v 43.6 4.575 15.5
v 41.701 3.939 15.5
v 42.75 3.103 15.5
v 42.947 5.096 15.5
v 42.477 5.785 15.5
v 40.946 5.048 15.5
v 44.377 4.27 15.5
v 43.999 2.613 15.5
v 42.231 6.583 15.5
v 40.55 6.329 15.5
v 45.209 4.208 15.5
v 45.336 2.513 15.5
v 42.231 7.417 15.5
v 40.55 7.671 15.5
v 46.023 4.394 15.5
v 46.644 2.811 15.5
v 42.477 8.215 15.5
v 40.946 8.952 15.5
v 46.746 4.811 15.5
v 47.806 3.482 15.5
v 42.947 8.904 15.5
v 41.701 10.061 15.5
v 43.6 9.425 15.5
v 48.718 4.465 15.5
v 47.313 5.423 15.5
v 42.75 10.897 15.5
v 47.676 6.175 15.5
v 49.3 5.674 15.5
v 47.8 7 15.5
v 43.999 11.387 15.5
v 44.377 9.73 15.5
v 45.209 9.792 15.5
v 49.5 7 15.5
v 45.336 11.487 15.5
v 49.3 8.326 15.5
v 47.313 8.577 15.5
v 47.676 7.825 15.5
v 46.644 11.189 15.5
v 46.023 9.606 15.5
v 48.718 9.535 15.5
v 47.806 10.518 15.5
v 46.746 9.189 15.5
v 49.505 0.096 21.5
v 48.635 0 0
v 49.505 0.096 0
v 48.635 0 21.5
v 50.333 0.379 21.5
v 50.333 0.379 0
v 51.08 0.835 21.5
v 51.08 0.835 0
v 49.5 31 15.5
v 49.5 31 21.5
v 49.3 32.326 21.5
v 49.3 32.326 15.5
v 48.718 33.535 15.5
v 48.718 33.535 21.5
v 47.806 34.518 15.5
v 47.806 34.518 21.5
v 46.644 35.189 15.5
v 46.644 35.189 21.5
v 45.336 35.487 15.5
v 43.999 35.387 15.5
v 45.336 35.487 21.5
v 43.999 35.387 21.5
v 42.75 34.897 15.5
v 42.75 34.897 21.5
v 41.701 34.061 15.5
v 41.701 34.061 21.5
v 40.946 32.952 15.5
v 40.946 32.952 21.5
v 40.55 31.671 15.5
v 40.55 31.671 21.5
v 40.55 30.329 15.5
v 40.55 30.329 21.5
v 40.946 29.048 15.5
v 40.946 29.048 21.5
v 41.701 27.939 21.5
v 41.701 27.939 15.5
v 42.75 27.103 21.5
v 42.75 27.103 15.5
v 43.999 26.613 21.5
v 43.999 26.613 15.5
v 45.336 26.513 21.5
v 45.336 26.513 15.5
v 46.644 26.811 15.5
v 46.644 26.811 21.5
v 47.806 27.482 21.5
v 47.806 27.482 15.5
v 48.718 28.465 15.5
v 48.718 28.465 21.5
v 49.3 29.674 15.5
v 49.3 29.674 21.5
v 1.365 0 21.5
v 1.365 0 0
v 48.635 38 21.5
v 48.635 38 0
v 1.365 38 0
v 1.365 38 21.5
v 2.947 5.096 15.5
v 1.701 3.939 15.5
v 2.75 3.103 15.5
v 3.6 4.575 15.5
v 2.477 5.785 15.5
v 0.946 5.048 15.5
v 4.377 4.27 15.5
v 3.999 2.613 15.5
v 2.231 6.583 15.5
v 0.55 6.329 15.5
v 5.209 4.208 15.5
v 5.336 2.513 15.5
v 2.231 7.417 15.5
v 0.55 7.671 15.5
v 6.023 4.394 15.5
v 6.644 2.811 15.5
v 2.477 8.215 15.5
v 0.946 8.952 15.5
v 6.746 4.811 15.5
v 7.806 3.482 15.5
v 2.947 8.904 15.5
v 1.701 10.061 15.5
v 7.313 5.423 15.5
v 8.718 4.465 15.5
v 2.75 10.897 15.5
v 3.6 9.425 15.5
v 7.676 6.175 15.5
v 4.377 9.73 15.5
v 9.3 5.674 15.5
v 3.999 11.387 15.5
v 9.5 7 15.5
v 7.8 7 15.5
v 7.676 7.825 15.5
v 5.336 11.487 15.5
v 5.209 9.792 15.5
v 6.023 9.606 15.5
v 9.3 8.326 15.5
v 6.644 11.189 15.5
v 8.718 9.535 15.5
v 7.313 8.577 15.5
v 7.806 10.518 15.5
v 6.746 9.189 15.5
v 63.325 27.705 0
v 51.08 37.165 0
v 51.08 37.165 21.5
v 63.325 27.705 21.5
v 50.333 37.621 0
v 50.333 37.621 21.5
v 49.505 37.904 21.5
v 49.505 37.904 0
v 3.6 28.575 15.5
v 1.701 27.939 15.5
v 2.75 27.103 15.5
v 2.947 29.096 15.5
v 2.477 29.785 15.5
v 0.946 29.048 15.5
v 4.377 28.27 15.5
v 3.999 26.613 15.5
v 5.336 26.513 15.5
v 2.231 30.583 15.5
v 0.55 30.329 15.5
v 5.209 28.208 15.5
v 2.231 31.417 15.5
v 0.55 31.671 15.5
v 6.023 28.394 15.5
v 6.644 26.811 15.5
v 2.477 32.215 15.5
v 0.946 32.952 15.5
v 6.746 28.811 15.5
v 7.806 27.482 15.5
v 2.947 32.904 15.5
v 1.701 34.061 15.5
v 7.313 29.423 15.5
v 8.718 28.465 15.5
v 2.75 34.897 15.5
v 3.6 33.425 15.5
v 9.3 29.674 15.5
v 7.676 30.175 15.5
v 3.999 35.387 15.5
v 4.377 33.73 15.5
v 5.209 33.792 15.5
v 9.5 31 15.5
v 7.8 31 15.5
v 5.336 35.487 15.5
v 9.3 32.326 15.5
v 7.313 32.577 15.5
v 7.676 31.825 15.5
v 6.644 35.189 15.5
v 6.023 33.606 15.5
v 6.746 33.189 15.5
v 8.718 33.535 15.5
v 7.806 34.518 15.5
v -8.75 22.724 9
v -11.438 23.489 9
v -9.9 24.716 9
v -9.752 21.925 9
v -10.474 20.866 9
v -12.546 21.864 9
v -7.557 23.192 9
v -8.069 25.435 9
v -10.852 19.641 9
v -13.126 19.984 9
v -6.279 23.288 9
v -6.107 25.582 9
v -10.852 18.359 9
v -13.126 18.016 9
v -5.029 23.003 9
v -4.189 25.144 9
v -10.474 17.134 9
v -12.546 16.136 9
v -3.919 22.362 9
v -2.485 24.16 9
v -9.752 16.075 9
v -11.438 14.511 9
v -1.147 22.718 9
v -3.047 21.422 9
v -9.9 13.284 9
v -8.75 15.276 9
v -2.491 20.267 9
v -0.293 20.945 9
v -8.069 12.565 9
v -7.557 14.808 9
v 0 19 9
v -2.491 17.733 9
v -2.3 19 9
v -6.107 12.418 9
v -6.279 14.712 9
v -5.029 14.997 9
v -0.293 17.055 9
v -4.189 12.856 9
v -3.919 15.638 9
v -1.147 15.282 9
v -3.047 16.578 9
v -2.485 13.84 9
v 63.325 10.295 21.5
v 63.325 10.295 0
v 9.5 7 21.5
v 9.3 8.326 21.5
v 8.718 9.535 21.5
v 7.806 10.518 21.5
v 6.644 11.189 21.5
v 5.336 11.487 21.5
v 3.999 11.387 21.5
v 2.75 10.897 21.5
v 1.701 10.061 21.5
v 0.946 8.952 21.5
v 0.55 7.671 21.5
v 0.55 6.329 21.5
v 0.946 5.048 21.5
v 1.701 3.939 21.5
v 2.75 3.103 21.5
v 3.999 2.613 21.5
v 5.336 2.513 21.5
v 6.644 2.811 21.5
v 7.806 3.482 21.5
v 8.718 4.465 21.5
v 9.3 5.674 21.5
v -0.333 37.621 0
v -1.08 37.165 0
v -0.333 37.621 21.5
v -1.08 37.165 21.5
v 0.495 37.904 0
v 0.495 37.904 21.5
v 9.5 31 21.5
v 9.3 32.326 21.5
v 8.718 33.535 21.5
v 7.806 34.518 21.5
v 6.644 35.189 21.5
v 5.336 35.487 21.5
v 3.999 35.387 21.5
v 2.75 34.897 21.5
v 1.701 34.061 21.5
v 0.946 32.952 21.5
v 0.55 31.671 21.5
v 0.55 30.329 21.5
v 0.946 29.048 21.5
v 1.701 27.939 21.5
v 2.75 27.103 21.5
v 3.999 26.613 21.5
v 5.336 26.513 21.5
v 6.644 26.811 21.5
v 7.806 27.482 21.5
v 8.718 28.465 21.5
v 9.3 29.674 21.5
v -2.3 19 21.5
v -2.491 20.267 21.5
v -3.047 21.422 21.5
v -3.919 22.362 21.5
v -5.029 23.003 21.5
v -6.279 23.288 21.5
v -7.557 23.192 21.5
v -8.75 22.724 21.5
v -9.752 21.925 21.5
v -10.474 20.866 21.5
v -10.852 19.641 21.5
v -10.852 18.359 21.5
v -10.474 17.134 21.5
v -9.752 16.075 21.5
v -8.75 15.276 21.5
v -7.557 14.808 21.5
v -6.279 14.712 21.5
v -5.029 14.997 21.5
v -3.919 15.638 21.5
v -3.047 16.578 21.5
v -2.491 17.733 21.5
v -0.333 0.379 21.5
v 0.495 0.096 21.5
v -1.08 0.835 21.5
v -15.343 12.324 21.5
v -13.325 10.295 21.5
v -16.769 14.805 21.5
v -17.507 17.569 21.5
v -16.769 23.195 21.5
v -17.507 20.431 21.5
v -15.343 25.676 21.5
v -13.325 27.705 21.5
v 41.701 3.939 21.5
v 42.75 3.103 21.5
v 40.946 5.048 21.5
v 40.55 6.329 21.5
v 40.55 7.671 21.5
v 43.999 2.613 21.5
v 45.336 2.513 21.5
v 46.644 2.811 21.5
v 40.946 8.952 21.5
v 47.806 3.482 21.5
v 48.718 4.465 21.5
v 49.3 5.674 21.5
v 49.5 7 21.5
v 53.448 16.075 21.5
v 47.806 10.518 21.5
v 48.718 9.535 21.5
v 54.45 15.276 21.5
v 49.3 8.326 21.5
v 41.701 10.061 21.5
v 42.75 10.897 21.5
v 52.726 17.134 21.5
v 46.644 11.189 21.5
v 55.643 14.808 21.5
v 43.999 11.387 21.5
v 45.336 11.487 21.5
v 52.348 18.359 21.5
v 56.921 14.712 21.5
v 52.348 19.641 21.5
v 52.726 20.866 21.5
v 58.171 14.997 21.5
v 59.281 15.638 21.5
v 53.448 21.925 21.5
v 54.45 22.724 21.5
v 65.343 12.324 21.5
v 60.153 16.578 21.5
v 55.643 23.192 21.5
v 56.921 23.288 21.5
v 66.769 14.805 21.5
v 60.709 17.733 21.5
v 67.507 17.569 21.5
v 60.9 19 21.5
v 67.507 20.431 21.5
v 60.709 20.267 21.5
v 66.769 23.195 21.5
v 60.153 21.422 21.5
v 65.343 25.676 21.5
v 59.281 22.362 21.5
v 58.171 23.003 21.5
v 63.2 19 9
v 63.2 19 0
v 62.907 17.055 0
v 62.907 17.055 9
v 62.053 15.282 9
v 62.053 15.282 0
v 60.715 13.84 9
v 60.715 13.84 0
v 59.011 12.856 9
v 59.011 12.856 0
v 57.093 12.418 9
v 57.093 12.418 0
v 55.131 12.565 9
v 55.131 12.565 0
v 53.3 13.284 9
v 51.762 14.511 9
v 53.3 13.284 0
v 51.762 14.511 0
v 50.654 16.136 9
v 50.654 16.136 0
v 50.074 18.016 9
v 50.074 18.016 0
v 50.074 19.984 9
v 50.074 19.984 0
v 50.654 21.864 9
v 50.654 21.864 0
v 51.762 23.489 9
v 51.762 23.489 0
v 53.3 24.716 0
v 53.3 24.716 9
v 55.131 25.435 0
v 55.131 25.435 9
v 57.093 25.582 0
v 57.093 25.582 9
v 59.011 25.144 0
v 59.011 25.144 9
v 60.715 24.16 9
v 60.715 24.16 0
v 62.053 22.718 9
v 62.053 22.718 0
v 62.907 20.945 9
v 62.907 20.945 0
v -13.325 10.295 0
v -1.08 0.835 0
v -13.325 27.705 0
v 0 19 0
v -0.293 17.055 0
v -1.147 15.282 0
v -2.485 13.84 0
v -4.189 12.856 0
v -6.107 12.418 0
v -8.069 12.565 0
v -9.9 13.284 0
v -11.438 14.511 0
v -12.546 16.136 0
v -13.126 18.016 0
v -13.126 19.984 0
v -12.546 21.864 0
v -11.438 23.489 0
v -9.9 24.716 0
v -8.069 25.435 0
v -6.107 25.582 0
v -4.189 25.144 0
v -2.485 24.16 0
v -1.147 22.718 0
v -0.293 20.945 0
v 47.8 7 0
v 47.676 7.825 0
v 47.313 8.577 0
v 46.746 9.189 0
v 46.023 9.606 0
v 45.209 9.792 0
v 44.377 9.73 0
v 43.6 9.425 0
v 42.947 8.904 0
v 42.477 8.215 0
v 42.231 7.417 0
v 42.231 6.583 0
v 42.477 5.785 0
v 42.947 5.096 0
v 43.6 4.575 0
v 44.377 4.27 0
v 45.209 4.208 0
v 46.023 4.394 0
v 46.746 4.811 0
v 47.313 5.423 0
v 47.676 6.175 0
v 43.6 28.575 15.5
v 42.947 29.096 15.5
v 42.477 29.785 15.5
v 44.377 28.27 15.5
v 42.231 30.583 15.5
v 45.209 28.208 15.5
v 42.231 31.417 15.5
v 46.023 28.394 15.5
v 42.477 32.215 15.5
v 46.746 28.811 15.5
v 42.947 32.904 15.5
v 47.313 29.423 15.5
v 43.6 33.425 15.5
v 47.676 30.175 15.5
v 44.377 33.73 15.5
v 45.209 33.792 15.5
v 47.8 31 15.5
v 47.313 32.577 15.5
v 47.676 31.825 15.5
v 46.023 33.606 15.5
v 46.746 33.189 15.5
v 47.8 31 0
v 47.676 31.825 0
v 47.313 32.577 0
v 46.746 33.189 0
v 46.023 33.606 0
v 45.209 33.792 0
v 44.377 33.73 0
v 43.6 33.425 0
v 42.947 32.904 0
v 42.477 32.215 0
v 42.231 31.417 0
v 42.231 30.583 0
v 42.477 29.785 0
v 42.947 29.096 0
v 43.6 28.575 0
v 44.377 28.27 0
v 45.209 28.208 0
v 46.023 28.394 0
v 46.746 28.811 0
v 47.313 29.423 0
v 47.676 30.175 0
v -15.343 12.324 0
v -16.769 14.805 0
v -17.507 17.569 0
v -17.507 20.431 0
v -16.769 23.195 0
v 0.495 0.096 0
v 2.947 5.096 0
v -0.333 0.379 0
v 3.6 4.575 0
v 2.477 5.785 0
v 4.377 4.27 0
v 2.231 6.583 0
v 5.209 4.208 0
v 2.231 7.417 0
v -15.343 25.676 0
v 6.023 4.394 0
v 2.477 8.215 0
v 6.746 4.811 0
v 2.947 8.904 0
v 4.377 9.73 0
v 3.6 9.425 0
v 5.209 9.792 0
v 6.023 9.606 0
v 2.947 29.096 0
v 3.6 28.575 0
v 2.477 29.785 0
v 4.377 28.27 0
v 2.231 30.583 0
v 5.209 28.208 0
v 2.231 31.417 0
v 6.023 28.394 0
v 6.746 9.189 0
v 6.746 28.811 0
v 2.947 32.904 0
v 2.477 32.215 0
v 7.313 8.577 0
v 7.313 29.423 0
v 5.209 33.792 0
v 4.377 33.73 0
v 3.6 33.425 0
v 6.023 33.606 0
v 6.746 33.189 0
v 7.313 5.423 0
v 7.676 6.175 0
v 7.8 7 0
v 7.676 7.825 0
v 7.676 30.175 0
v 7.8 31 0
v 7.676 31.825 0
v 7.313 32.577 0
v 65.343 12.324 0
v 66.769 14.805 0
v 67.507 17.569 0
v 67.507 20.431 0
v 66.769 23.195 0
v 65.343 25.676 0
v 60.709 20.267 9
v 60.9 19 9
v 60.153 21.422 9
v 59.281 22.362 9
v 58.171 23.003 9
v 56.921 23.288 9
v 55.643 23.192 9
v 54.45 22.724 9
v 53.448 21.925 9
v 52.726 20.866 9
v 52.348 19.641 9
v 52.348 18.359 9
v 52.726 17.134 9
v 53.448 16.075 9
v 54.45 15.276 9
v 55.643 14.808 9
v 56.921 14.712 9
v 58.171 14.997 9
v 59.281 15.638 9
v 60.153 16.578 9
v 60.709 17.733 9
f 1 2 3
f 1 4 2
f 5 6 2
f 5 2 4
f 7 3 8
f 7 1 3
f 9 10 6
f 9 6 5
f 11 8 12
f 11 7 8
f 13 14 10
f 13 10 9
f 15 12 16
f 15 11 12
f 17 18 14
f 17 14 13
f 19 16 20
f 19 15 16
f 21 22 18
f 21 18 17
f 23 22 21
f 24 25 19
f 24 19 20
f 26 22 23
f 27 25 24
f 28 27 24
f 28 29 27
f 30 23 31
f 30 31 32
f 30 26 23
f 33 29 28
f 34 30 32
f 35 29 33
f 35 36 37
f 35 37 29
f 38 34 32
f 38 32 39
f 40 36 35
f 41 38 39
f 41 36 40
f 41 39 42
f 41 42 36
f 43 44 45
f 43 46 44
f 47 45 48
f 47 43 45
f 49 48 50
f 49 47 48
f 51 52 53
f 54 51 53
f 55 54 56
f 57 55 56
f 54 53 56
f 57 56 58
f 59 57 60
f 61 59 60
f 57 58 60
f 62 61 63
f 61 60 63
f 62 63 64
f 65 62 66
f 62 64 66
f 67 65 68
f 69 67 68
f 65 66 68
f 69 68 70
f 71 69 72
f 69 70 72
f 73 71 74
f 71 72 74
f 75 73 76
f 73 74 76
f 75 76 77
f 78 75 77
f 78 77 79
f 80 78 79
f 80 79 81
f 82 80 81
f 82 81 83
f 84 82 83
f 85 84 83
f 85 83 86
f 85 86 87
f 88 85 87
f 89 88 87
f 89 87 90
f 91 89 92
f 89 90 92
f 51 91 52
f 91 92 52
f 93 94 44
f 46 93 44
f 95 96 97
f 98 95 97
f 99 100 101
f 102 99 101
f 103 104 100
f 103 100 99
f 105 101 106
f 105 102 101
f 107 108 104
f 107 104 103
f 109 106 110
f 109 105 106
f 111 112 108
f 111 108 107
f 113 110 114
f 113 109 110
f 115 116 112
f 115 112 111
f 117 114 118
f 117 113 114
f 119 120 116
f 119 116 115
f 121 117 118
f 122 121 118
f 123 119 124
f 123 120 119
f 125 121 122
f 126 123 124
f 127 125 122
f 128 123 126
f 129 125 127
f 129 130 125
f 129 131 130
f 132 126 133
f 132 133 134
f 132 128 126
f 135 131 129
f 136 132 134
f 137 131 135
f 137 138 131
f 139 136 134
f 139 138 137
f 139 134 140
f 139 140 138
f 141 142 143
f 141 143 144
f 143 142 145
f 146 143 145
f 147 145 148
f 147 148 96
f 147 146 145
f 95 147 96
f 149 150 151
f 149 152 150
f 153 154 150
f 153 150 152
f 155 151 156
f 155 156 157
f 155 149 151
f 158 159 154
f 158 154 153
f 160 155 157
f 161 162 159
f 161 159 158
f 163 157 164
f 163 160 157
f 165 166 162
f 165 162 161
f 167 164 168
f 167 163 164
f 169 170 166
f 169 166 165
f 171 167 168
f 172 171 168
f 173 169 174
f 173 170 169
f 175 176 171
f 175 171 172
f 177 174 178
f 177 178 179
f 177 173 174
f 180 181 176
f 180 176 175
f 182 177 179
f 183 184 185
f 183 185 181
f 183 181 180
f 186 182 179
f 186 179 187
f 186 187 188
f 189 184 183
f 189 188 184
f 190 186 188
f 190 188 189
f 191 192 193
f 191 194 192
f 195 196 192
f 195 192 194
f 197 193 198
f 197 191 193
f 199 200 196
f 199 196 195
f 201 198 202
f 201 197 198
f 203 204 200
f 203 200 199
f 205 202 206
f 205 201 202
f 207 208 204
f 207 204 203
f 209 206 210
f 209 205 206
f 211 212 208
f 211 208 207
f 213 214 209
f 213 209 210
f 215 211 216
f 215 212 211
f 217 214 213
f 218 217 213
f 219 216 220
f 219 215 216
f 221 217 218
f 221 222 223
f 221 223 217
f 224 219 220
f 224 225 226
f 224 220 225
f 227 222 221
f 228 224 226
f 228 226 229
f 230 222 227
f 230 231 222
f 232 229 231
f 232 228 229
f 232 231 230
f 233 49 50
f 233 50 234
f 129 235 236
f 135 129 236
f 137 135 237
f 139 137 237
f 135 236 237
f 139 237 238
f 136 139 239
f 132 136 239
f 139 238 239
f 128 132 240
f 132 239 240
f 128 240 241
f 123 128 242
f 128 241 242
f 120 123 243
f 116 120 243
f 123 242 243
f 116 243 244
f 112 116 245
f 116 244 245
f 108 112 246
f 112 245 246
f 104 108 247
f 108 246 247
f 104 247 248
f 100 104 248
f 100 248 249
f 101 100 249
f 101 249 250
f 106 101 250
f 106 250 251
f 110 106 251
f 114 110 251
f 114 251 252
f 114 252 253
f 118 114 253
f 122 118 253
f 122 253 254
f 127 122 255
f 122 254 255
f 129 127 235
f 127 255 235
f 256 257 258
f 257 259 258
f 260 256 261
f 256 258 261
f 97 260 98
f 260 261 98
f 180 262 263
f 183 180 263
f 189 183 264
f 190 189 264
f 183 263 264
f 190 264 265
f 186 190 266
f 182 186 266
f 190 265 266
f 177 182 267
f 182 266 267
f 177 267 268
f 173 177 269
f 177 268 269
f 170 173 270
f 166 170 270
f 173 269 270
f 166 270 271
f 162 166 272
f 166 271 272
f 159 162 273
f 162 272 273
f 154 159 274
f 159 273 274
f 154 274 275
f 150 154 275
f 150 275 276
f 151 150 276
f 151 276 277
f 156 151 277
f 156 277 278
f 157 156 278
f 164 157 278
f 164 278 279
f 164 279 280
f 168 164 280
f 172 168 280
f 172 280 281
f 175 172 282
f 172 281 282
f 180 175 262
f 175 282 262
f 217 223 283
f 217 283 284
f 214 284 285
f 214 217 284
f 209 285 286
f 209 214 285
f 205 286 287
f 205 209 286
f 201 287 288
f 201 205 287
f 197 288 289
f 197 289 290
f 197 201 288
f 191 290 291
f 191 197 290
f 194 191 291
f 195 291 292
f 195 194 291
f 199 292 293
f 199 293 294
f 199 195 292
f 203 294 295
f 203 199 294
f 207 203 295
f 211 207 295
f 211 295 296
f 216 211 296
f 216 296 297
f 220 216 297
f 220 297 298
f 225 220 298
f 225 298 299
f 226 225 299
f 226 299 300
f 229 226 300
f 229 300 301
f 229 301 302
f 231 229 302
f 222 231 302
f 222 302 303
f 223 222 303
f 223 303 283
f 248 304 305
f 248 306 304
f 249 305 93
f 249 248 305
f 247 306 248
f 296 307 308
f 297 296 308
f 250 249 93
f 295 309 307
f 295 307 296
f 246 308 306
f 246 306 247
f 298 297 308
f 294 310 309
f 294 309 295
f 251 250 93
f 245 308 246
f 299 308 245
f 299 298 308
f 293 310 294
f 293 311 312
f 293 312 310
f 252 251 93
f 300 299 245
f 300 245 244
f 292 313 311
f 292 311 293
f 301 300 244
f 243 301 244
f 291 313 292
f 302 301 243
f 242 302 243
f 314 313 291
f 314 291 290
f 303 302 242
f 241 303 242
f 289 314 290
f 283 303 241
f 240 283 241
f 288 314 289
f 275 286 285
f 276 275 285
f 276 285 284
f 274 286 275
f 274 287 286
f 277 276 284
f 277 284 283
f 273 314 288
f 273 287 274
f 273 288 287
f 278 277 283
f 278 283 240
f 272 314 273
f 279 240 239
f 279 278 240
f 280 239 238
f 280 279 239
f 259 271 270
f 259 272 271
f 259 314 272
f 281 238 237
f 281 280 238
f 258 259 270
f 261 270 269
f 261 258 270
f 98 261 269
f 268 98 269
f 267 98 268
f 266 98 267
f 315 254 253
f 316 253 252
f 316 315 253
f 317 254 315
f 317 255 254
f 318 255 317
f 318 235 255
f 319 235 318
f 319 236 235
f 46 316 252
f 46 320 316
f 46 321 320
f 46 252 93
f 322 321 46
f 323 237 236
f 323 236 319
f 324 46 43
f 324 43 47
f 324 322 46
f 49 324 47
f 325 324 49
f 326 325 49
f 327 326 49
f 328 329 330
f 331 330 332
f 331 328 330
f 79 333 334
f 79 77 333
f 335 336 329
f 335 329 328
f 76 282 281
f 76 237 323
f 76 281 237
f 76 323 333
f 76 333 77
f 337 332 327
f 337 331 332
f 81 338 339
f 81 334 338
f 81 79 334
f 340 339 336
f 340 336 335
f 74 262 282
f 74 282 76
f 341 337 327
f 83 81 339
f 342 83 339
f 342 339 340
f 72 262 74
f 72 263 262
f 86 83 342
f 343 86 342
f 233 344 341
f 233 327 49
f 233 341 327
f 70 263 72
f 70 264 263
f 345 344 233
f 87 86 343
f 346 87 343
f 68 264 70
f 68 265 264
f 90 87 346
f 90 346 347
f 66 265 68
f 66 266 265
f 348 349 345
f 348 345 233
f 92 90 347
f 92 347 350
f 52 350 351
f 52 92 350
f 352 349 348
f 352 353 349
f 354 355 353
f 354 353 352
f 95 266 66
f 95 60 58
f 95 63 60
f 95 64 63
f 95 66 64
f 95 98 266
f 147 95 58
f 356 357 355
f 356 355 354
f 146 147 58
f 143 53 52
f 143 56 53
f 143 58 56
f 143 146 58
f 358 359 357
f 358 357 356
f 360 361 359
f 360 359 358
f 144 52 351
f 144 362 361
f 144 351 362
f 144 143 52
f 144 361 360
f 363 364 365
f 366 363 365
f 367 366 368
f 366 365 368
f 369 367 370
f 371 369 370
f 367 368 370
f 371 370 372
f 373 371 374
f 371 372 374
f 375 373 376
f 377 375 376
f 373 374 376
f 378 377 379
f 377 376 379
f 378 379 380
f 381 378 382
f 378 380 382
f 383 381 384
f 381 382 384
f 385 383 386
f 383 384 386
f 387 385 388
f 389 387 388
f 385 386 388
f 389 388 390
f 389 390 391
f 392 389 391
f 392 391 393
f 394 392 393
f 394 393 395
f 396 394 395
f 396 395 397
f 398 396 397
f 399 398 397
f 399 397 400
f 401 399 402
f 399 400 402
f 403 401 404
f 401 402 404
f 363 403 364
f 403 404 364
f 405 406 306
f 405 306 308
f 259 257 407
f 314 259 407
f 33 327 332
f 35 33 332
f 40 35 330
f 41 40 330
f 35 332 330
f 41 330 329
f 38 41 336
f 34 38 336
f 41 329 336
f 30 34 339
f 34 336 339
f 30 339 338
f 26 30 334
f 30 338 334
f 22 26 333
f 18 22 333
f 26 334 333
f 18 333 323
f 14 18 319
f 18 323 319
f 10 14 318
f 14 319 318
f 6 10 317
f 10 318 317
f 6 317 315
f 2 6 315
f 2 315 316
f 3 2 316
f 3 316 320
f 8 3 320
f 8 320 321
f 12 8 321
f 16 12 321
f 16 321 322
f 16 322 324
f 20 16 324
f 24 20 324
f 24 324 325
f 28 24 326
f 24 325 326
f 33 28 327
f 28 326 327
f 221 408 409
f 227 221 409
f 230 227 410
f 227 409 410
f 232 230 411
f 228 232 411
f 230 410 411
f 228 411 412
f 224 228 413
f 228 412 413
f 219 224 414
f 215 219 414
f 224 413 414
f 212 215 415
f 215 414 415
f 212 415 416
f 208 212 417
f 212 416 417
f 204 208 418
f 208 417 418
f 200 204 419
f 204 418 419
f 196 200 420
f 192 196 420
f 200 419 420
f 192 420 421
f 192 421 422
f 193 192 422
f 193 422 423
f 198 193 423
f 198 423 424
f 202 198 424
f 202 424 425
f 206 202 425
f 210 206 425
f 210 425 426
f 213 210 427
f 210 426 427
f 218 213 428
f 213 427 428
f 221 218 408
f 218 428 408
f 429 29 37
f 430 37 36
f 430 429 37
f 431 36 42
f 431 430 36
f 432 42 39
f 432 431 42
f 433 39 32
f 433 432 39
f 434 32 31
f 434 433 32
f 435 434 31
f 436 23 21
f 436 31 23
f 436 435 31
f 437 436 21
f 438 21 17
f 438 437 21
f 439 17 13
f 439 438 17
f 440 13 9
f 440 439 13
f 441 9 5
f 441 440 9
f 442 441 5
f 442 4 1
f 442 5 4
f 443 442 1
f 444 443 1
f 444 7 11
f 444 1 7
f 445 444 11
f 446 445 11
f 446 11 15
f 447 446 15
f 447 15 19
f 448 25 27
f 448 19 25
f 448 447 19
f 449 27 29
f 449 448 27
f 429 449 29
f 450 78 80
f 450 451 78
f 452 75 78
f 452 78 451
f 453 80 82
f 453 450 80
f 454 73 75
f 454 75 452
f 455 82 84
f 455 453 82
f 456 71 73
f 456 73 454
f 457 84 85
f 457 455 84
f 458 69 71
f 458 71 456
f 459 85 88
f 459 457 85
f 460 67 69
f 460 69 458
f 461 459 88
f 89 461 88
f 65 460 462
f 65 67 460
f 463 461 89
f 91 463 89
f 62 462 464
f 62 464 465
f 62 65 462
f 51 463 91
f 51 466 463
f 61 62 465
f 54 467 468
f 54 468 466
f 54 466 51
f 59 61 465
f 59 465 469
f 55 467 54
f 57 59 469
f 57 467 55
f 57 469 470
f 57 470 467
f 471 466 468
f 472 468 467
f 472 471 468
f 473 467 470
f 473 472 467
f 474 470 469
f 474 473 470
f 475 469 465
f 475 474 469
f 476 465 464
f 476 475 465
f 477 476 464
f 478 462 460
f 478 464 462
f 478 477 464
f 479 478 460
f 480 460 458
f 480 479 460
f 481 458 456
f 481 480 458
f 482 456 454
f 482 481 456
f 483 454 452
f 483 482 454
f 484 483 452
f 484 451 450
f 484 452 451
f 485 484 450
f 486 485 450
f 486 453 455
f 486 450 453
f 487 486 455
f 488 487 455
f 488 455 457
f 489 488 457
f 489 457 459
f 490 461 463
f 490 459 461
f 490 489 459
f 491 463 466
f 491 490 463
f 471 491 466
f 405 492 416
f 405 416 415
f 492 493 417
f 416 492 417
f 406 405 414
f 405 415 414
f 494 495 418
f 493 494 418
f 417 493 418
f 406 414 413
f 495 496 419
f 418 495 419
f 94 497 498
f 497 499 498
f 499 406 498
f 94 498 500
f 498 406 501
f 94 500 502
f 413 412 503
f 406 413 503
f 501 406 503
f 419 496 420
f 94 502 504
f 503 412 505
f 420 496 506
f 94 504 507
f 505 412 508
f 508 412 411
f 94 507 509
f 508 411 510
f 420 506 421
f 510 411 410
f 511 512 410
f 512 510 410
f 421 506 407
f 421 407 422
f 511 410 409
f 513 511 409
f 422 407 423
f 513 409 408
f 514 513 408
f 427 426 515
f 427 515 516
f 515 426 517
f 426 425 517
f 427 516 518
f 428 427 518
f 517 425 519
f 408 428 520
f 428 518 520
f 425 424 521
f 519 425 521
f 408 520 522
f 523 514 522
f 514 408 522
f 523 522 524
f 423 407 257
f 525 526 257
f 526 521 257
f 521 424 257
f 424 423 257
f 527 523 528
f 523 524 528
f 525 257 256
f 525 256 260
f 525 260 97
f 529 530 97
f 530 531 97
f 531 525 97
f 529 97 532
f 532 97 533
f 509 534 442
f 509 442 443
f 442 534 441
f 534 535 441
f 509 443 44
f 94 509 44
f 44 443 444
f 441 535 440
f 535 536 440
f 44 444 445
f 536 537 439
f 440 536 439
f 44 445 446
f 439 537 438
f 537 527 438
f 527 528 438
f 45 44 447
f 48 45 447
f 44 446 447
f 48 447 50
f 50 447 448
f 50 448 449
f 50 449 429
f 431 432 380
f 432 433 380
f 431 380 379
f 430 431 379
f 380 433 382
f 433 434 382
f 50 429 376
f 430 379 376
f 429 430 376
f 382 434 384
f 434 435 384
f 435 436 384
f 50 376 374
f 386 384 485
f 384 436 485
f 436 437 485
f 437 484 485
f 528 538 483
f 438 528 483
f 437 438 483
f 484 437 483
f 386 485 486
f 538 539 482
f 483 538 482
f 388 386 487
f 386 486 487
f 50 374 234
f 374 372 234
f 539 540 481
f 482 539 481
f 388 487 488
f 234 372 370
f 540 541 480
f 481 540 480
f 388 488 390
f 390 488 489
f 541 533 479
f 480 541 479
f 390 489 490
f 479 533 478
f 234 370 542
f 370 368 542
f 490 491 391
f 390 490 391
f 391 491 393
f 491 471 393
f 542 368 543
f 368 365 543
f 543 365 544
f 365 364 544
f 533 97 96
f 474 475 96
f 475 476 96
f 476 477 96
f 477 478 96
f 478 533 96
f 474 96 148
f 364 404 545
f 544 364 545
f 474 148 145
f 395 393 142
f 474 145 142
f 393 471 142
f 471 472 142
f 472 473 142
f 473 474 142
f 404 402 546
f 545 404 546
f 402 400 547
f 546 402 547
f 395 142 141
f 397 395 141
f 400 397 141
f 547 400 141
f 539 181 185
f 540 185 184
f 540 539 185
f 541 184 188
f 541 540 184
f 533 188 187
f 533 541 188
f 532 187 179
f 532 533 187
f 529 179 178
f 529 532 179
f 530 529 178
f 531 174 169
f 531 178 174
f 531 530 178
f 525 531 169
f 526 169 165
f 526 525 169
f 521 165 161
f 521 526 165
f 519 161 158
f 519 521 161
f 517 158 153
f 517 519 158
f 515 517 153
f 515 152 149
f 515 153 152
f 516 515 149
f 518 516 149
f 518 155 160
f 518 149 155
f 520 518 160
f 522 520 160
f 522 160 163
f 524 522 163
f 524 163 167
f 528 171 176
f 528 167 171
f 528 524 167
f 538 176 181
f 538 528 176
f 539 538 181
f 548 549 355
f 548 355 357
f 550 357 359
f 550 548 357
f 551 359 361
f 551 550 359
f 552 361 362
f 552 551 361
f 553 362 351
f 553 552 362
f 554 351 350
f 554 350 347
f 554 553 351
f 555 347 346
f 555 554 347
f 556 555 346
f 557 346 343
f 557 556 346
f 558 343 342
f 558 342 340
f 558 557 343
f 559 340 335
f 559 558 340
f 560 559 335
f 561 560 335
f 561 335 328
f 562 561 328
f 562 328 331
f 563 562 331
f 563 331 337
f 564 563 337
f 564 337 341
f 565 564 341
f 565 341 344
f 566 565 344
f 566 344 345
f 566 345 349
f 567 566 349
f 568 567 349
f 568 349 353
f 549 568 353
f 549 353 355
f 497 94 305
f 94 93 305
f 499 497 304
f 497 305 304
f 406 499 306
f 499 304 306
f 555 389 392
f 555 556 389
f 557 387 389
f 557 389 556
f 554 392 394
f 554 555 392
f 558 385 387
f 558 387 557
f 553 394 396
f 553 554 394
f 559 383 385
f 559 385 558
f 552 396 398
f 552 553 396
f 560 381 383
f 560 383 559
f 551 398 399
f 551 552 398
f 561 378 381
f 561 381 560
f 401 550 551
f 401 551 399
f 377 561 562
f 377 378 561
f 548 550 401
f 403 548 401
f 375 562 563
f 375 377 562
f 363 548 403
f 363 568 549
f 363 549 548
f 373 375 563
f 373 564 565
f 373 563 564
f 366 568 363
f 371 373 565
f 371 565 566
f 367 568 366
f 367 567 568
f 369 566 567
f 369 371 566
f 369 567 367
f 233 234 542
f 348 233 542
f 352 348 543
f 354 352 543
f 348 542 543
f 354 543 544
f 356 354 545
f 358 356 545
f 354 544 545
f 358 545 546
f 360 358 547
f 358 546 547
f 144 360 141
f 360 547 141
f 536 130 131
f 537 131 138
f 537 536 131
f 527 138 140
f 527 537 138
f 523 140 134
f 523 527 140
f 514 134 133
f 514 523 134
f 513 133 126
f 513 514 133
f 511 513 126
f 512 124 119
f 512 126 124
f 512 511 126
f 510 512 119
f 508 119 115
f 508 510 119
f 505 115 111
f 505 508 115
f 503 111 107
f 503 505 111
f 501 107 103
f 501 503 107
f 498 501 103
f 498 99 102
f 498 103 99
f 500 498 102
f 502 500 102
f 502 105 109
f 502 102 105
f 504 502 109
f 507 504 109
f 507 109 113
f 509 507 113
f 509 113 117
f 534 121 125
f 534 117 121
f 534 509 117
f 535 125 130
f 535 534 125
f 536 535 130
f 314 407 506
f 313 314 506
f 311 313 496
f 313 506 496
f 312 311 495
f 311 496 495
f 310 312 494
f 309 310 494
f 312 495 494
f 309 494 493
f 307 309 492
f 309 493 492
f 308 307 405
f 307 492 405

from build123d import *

# Parameters (mm, degrees)
SKETCH_R        = 2.8
SKETCH_R_2      = 4.3
PAD_DEPTH       = 21.5
SKETCH001_R     = 4.5
POCKET_DEPTH    = 6
SKETCH002_R     = 6.6
POCKET001_DEPTH = 9
FILLET_R        = 4


with BuildPart() as part:
    # Sketch → Pad (new body)
    with BuildSketch(Plane.XY):
        with BuildLine():
            Line((0, 0), (50, 0))
            Line((50, 0), (63.325334, 10.29541))
            ThreePointArc((63.325334, 10.29541), (67.6, 19), (63.325334, 27.70459))
            Line((50, 38), (63.325334, 27.70459))
            Line((50, 38), (0, 38))
            Line((0, 38), (-13.325334, 27.70459))
            ThreePointArc((-13.325334, 27.70459), (-17.6, 19), (-13.325334, 10.29541))
            Line((0, 0), (-13.325334, 10.29541))
        make_face()
        with Locations((5, 31)):
            Circle(SKETCH_R, mode=Mode.SUBTRACT)
        with Locations((45, 31)):
            Circle(SKETCH_R, mode=Mode.SUBTRACT)
        with Locations((45, 7)):
            Circle(SKETCH_R, mode=Mode.SUBTRACT)
        with Locations((5, 7)):
            Circle(SKETCH_R, mode=Mode.SUBTRACT)
        with Locations((-6.6, 19)):
            Circle(SKETCH_R_2, mode=Mode.SUBTRACT)
        with Locations((56.6, 19)):
            Circle(SKETCH_R_2, mode=Mode.SUBTRACT)
    extrude(amount=PAD_DEPTH)

    # Sketch001 (on Face16 of Pad) → Pocket (cut)
    with BuildSketch(Plane.XY.offset(21.5)):
        with Locations((5, 31)):
            Circle(SKETCH001_R)
        with Locations((45, 31)):
            Circle(SKETCH001_R)
        with Locations((45, 7)):
            Circle(SKETCH001_R)
        with Locations((5, 7)):
            Circle(SKETCH001_R)
    extrude(amount=-POCKET_DEPTH, mode=Mode.SUBTRACT)

    # Sketch002 (on Face4 of Pocket) → Pocket001 (cut)
    with BuildSketch(Plane(origin=(0, 0, 0), x_dir=(1, 0, 0), z_dir=(0, 0, -1))):
        with Locations((-6.6, -19)):
            Circle(SKETCH002_R)
        with Locations((56.6, -19)):
            Circle(SKETCH002_R)
    extrude(amount=-POCKET001_DEPTH, mode=Mode.SUBTRACT)

    # Fillet
    fillet_edges = [part.edges().sort_by_distance(p)[0] for p in [
        (0, 38, 10.75),
        (0, 0, 10.75),
        (50, 0, 10.75),
        (50, 38, 10.75),
    ]]
    fillet(fillet_edges, radius=FILLET_R)


solid = part.part
